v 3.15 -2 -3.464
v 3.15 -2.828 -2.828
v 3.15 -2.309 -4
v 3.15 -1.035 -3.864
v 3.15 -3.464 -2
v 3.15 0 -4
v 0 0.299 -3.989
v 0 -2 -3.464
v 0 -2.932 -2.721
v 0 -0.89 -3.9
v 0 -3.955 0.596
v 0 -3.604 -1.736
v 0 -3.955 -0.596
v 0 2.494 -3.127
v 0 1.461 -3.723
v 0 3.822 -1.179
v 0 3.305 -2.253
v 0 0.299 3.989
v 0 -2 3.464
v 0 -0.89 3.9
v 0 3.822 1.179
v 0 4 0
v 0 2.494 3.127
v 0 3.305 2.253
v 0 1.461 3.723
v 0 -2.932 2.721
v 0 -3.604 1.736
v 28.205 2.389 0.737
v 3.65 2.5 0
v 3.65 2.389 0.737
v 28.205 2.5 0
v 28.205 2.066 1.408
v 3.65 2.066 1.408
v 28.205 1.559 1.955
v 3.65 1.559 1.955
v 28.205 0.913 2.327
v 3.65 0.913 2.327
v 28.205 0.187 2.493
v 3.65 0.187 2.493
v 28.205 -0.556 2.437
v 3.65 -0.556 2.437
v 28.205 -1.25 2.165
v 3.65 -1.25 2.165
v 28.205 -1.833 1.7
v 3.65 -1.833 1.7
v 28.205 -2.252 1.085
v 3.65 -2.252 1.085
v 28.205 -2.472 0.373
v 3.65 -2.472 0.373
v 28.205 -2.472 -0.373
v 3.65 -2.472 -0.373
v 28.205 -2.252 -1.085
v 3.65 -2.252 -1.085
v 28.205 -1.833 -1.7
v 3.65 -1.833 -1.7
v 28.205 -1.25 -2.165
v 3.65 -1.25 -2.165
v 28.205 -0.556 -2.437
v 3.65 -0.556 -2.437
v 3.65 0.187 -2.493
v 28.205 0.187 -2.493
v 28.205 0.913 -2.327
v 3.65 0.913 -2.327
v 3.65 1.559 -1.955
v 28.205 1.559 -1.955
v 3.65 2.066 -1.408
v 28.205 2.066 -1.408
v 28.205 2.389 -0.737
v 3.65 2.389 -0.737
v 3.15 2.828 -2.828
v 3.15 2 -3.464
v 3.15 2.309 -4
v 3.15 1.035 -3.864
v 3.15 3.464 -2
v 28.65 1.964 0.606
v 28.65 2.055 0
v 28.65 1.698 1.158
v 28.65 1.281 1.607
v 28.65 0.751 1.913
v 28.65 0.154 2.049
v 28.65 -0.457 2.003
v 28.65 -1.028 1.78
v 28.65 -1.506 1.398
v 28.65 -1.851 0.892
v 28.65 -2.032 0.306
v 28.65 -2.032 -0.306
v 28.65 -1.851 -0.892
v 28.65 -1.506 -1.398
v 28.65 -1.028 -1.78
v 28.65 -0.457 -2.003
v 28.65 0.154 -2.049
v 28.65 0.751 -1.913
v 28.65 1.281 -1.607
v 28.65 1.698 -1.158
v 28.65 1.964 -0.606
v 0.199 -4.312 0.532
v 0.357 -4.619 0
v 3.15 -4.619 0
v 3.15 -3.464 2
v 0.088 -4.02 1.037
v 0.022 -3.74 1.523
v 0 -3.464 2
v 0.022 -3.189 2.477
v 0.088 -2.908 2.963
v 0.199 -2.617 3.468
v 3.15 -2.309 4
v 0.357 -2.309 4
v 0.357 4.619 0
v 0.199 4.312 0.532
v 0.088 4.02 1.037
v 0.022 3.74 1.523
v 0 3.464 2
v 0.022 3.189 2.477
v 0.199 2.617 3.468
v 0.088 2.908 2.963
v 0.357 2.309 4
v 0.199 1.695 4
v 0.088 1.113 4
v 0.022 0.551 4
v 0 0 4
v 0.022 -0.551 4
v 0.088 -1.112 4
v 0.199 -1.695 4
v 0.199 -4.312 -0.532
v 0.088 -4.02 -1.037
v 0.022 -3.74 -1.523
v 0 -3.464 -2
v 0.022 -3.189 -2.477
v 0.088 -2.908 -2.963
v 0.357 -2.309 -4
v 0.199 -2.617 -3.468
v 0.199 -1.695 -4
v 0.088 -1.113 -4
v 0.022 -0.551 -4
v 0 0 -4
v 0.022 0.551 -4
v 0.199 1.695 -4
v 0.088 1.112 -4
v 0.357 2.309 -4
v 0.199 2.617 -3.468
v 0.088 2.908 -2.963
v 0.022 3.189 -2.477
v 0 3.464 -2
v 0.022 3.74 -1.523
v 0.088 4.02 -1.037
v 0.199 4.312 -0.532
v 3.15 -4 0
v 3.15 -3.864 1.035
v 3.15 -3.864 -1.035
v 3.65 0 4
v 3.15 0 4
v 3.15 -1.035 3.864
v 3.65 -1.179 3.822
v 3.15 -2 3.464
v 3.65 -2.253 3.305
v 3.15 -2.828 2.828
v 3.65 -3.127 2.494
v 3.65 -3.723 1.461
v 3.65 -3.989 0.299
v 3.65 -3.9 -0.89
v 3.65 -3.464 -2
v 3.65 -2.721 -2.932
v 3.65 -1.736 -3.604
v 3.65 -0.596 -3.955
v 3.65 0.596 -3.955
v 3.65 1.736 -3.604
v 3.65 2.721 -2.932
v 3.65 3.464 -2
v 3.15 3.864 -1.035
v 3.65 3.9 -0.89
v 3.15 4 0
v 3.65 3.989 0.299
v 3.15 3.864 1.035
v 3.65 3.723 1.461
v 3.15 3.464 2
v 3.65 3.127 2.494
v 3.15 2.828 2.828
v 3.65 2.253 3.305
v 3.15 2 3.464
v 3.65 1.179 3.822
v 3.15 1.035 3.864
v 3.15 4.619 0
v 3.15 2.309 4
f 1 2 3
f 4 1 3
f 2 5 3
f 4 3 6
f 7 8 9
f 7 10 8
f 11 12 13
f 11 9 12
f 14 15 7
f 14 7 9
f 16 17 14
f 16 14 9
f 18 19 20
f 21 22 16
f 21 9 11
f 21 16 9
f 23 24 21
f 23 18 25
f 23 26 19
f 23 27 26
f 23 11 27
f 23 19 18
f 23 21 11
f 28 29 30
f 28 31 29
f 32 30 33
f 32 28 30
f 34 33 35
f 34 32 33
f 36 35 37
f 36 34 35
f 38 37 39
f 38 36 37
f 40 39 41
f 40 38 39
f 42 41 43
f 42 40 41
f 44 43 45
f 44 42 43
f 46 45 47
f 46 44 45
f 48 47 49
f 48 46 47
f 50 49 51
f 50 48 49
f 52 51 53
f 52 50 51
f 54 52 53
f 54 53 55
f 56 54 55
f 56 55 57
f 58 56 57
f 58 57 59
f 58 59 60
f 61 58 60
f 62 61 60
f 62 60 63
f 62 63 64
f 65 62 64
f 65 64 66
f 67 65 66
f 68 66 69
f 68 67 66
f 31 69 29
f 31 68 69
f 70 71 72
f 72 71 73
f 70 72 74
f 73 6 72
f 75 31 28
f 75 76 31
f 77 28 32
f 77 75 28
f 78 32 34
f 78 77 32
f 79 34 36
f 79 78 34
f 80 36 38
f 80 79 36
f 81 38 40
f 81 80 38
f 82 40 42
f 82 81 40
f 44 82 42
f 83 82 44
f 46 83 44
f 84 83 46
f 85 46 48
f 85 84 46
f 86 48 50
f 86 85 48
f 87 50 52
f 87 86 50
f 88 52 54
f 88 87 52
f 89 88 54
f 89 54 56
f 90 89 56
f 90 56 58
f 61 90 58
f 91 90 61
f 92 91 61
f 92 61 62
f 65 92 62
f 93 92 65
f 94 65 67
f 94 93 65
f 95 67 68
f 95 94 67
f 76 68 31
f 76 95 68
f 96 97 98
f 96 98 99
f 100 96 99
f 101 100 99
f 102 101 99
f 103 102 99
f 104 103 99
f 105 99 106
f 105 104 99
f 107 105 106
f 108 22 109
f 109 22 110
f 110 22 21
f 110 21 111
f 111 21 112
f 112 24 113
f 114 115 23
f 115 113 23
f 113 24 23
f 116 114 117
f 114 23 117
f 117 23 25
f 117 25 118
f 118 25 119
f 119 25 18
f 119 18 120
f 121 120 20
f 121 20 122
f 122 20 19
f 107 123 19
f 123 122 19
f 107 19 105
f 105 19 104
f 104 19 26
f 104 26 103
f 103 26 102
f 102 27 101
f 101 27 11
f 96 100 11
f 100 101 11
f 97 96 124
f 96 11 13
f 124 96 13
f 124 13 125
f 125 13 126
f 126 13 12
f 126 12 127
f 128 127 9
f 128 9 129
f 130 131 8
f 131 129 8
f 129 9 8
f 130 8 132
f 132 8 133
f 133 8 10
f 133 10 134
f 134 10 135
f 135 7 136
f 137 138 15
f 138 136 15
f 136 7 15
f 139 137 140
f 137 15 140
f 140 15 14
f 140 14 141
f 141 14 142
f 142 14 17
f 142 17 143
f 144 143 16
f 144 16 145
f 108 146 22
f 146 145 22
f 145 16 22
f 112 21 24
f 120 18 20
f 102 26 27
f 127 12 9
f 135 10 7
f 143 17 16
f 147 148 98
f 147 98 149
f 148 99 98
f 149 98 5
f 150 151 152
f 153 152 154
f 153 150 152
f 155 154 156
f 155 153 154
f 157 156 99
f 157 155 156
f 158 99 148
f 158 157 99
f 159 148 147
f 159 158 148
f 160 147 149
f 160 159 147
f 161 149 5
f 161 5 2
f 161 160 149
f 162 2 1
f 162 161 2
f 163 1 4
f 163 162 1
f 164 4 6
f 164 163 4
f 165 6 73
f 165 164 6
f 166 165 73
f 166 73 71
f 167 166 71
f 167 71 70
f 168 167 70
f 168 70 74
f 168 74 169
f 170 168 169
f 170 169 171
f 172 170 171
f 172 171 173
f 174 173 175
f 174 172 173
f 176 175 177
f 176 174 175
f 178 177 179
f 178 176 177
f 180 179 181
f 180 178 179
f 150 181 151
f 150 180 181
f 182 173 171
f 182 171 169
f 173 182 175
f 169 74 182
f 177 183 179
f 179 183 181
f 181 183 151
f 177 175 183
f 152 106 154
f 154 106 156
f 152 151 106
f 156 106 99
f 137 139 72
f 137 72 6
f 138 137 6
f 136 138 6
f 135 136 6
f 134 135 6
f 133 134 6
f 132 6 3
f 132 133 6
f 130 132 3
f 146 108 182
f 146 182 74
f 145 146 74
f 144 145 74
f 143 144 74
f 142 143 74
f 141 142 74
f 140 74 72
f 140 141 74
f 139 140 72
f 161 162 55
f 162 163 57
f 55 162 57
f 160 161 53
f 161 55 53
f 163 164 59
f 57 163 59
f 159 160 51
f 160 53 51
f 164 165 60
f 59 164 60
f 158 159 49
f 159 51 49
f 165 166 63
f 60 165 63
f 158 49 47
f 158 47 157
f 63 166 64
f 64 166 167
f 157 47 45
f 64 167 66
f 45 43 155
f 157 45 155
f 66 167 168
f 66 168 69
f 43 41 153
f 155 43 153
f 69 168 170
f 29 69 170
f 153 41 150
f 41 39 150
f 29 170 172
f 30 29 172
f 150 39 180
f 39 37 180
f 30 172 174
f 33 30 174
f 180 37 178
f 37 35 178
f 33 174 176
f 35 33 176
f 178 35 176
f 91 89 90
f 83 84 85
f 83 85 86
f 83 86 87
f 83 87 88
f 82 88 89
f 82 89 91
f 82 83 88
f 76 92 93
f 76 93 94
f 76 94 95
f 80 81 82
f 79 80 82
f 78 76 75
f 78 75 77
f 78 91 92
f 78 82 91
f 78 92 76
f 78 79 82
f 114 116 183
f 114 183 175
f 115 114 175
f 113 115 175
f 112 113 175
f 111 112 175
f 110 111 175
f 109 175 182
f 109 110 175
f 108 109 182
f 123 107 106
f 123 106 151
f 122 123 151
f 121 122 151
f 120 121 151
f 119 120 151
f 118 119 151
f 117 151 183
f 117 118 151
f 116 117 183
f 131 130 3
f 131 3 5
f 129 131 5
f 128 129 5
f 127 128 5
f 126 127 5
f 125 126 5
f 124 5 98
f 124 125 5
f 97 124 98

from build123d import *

# Parameters (mm, degrees)
BASEHEAD_DEPTH = 3.65
SKETCH4_W      = 0.5
SKETCH4_H      = 10.618802154


# Read off the part's stored shape, not the designer's step: HeadChamfer
with BuildPart() as part:
    # Sketch1 → BaseHead (new body)
    with BuildSketch(Plane(origin=(0, 0, 0), x_dir=(0, 0, -1), z_dir=(1, 0, 0))):
        Polygon((4, 2.309401077), (4, -2.309401077), (0, -4.618802154), (-4, -2.309401077), (-4, 2.309401077), (0, 4.618802154), align=None)
    extrude(amount=BASEHEAD_DEPTH)

    # HeadChamfer outline → HeadChamfer (revolve, cut)
    with BuildSketch(Plane.YX):
        Polygon((4.618802148, 0.357265587), (3.999999382, -3.57e-07), (4.618802154, -3.57e-07), align=None)
    revolve(axis=Axis((0, 0, 0), (1, 0, 0)), mode=Mode.SUBTRACT)

    # HeadChamfer 2 outline → HeadChamfer 2 (revolve)
    with BuildSketch(Plane.YX):
        Polygon((2.5, 3.65), (2.5, 28.205), (2.055, 28.65), (0, 28.65), (0, 3.65), align=None)
    revolve(axis=Axis((0, 0, 0), (1, 0, 0)))

    # Sketch4 → BearingFace (revolve, cut)
    with BuildSketch(Plane.XY, mode=Mode.PRIVATE) as bearingface_sk:
        with Locations((3.4, 9.309401077)):
            Rectangle(SKETCH4_W, SKETCH4_H)
    revolve(bearingface_sk.sketch.rotate(Axis((0, 0, 0), (1, 0, 0)), 90), axis=Axis((0, 0, 0), (1, 0, 0)), mode=Mode.SUBTRACT)


solid = part.part
